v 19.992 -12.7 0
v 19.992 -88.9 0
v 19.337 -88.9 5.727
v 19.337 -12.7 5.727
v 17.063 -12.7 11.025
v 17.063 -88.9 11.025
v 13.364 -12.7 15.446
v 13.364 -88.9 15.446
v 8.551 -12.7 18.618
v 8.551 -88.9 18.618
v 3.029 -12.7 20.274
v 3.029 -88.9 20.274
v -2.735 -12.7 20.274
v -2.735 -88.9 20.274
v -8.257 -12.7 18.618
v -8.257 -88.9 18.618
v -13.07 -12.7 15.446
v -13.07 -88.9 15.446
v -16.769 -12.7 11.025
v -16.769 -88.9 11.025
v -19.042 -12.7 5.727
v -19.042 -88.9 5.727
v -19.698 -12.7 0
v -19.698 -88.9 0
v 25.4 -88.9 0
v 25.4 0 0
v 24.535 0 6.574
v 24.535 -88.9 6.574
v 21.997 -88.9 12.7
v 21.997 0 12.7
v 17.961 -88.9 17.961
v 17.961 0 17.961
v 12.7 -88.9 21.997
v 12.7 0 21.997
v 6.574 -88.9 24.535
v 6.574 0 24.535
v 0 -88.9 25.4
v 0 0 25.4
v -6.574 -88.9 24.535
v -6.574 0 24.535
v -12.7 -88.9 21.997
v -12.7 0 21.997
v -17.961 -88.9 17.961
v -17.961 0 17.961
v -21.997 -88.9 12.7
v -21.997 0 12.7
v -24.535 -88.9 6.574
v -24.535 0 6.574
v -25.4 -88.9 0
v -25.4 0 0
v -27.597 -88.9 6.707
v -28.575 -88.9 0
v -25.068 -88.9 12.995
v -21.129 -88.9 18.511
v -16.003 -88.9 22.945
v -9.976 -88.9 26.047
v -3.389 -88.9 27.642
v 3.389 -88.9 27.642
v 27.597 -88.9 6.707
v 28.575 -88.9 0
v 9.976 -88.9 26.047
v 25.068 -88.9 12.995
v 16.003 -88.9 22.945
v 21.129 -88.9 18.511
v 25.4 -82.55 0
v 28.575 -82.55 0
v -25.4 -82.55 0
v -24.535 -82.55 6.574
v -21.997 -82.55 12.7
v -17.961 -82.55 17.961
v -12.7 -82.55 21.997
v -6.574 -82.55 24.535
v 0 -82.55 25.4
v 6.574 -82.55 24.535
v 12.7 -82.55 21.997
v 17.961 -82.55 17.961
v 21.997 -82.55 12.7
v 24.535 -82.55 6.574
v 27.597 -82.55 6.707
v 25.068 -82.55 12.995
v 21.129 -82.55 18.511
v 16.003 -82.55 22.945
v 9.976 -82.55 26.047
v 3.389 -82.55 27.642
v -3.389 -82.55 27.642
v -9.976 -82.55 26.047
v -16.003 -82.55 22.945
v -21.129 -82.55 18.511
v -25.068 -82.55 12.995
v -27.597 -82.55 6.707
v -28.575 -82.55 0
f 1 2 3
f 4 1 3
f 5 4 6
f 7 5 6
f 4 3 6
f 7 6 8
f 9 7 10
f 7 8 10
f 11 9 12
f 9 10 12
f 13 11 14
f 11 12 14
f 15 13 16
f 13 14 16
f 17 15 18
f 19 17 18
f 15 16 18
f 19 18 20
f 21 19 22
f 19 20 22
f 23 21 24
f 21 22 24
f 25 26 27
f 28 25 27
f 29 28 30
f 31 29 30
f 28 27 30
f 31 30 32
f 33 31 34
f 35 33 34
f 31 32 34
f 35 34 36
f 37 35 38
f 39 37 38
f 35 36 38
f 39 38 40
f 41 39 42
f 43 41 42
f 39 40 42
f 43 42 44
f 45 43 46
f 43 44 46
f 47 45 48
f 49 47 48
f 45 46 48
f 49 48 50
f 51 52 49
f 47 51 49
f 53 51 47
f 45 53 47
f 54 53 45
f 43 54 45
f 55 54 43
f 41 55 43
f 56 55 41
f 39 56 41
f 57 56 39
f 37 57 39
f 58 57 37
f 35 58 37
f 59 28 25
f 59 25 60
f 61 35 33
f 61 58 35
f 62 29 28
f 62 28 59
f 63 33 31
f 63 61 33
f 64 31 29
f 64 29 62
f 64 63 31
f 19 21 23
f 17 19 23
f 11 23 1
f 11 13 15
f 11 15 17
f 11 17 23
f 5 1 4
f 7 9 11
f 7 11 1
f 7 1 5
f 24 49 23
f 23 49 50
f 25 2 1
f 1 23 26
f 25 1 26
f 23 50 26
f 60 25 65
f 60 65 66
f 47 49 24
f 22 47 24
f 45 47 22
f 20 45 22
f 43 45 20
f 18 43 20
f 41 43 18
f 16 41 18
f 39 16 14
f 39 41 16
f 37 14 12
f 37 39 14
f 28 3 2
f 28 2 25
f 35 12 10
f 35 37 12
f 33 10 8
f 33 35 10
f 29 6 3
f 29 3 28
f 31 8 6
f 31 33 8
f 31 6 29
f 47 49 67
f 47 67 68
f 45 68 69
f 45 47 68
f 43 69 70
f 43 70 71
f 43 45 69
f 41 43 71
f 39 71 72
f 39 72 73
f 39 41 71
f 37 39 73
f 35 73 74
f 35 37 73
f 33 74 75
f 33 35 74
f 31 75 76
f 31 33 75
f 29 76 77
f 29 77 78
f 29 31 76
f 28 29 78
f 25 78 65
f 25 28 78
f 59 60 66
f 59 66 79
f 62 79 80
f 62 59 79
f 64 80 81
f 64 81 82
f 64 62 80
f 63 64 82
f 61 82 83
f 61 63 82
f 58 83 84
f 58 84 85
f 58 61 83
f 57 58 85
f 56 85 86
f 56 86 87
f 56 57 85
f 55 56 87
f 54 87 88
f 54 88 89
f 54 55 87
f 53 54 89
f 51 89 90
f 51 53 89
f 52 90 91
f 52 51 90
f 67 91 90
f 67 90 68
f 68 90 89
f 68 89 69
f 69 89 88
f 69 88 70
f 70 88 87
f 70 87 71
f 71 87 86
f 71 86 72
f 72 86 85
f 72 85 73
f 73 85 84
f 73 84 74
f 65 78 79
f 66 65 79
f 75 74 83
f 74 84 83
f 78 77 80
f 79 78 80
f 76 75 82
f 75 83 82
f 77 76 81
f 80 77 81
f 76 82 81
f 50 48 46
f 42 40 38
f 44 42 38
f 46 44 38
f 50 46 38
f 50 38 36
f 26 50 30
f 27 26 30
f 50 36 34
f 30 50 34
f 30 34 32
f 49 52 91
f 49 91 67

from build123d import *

# Parameters (mm, degrees)
F1_DEPTH = 88.9
F3_DEPTH = 6.35
F5_DEPTH = 76.2


with BuildPart() as f1:
    # F0 (on Front) → F1 (new body)
    with BuildSketch(Plane.XZ):
        with BuildLine():
            Line((-25.4, 0), (25.4, 0))
            ThreePointArc((25.4, 0), (0, 25.4), (-25.4, 0))
        make_face()
    extrude(amount=F1_DEPTH)

    # F4 (on face) → F5 (cut)
    with BuildSketch(Plane.XZ.offset(88.9)):
        with BuildLine():
            Line((-19.698048, 0), (19.992232, 0))
            ThreePointArc((19.992232, 0), (0.147092, 20.484511), (-19.698048, 0))
        make_face()
    extrude(amount=-F5_DEPTH, mode=Mode.SUBTRACT)


with BuildPart() as f3:
    # F2 (on face) → F3 (new body)
    with BuildSketch(Plane.XZ.offset(88.9)):
        with BuildLine():
            ThreePointArc((-25.4, 0), (0, 25.4), (25.4, 0))
            Line((25.4, 0), (28.575, 0))
            ThreePointArc((28.575, 0), (0, 27.843911), (-28.575, 0))
            Line((-28.575, 0), (-25.4, 0))
        make_face()
    extrude(amount=-F3_DEPTH)


solid = Compound([f1.part, f3.part])
